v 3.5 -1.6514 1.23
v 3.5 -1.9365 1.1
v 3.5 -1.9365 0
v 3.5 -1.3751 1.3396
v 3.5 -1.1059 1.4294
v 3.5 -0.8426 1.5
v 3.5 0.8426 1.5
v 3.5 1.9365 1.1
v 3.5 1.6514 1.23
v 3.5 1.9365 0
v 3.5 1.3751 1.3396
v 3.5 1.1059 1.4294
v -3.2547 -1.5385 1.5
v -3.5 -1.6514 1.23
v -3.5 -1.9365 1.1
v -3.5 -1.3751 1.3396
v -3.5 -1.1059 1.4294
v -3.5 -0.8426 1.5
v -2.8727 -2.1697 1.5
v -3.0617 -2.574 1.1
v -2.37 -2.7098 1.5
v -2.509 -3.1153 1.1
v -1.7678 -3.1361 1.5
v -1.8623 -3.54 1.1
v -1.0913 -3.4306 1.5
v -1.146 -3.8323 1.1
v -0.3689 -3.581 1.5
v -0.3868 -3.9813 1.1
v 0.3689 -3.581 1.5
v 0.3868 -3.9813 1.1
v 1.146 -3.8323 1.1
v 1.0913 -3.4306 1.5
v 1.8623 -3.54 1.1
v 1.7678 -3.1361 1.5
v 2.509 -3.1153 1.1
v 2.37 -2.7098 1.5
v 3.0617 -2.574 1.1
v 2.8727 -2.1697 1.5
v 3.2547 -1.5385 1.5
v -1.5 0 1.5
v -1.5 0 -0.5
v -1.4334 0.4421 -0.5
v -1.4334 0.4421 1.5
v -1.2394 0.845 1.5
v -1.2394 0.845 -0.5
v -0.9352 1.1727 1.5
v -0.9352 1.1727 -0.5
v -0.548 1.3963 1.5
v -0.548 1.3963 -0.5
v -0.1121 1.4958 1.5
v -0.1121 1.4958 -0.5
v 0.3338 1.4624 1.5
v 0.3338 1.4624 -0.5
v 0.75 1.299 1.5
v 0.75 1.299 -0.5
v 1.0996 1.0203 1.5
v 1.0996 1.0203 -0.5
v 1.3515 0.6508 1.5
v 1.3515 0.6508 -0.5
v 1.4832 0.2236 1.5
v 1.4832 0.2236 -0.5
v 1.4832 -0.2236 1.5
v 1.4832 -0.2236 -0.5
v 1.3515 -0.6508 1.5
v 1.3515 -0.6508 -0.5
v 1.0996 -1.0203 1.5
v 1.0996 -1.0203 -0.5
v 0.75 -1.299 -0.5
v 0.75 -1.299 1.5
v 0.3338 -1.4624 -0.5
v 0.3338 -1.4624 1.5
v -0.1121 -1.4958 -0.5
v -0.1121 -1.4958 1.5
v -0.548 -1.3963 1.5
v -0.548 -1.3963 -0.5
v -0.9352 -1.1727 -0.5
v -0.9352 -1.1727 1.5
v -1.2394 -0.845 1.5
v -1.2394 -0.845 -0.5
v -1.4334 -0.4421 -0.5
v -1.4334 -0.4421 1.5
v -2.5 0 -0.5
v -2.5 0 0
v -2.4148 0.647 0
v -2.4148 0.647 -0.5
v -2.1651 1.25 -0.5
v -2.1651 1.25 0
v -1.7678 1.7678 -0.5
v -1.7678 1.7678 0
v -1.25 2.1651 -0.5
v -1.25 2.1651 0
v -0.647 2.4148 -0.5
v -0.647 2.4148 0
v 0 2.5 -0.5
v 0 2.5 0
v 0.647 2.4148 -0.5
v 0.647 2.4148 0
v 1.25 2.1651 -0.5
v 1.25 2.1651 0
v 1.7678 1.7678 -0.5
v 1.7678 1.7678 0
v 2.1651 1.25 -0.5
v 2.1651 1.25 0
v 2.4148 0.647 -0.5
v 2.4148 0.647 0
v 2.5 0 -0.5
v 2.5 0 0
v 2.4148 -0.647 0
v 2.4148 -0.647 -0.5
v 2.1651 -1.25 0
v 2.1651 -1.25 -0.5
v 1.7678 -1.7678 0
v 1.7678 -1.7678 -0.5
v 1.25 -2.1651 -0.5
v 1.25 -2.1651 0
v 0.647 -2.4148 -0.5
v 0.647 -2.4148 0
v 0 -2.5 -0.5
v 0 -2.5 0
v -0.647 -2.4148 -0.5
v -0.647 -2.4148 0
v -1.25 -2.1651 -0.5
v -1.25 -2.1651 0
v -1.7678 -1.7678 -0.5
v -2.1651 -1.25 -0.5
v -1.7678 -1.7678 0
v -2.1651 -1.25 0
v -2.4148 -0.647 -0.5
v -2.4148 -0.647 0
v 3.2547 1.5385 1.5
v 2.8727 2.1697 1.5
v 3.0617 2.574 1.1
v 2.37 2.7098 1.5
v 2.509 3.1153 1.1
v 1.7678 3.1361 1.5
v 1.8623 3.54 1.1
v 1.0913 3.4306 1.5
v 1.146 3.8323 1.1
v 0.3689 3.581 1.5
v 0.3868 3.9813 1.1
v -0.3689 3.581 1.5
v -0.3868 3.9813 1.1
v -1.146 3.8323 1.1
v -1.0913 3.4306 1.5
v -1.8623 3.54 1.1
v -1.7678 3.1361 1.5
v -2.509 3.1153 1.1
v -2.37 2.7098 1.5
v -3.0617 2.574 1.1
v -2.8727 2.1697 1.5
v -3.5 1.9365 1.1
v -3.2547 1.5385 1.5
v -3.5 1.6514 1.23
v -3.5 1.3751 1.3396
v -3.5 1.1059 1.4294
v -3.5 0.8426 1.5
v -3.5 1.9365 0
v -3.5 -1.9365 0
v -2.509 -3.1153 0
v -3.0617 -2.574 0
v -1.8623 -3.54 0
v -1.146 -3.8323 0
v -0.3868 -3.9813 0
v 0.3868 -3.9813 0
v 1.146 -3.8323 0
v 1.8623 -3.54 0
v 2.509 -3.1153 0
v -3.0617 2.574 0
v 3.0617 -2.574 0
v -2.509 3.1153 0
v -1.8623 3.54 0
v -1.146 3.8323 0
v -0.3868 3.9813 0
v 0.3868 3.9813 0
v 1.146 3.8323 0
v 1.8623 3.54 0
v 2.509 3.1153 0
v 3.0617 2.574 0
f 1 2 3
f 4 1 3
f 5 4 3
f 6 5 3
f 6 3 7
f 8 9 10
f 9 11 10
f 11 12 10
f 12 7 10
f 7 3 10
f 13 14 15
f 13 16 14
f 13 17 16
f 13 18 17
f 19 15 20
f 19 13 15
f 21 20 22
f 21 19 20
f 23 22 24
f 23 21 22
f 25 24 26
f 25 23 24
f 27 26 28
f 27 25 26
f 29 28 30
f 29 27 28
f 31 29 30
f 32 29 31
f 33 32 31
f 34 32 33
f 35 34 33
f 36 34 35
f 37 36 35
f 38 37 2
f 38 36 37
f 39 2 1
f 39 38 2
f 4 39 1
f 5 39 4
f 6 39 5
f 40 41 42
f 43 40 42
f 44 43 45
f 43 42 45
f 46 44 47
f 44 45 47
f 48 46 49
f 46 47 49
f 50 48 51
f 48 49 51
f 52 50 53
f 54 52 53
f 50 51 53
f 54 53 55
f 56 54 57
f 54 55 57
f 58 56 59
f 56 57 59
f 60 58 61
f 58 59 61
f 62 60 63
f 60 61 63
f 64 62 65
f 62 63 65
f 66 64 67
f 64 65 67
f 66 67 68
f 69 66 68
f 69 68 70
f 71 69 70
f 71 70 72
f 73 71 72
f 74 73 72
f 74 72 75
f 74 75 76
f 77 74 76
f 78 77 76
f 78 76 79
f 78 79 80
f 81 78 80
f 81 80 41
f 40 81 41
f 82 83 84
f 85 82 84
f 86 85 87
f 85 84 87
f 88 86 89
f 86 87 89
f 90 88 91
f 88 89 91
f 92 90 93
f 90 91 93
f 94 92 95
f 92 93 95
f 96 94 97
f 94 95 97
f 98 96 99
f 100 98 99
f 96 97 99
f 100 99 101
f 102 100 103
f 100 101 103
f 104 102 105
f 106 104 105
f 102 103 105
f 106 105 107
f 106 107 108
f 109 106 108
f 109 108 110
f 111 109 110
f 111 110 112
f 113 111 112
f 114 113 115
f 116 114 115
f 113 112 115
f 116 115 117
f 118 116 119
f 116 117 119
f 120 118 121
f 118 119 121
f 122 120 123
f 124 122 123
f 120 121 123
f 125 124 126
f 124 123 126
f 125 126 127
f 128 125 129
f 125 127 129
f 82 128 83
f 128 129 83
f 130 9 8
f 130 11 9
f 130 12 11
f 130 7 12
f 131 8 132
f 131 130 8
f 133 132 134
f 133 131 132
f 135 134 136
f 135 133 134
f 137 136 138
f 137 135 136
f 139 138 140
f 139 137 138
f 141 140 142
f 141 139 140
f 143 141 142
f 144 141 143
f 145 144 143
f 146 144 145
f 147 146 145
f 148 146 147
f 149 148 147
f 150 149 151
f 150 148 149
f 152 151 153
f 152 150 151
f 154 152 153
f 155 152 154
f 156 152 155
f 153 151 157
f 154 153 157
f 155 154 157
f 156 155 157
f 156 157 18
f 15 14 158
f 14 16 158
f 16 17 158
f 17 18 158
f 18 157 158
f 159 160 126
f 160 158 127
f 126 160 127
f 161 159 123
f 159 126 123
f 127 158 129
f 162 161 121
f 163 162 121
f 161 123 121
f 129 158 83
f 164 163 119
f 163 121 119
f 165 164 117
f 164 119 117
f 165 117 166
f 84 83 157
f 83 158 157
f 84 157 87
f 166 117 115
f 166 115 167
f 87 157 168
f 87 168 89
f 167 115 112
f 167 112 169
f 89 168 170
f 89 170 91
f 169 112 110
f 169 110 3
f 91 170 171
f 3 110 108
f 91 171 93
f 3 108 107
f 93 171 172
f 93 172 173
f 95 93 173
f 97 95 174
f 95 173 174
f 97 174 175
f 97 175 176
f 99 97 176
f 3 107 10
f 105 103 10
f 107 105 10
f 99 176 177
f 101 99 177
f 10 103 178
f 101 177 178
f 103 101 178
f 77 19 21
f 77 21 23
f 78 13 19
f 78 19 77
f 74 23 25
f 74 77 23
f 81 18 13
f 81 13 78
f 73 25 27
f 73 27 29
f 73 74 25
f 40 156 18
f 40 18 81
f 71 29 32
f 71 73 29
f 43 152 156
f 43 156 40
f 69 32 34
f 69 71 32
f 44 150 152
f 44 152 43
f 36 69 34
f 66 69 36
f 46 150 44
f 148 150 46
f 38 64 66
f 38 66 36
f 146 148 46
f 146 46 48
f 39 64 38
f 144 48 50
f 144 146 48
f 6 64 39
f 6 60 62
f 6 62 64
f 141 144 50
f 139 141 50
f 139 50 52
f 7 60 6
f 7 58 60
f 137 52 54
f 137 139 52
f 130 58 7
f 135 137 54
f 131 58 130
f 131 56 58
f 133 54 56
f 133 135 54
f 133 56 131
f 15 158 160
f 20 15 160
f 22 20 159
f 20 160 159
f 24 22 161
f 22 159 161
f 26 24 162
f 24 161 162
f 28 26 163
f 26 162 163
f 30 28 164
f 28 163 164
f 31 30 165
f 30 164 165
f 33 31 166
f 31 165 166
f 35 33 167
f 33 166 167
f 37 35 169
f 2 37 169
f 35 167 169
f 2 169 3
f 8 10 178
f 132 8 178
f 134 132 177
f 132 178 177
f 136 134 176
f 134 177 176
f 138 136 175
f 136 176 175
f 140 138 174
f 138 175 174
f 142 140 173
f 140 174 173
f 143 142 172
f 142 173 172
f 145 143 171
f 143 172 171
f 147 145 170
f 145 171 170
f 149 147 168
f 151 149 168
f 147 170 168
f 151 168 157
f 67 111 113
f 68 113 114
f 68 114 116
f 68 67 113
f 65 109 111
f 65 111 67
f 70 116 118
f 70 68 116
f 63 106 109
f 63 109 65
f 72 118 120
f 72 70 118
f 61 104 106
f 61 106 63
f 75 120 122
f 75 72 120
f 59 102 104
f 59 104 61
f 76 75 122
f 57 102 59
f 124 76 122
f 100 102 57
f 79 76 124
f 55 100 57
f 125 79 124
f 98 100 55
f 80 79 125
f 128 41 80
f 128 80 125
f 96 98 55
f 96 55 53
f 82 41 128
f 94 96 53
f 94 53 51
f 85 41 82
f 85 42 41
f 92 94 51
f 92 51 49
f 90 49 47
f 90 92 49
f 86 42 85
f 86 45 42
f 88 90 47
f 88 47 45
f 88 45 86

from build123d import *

# Parameters (mm, degrees)
BOSS_EXTRUDE1_DEPTH   = 1.5
SKETCH3_R             = 2.5
BOSS_EXTRUDE2_DEPTH   = 0.5
CHAMFER1_SIZE         = 0.4
F_3_0MM_DOWEL_HOLE1_D = 3


with BuildPart() as part:
    # Sketch1 → Boss-Extrude1 (new body)
    with BuildSketch(Plane.XY):
        with BuildLine():
            Line((-3.5, 1.936491673), (-3.5, -1.936491673))
            ThreePointArc((-3.5, -1.936491673), (0, -4), (3.5, -1.936491673))
            Line((3.5, -1.936491673), (3.5, 1.936491673))
            ThreePointArc((3.5, 1.936491673), (0, 4), (-3.5, 1.936491673))
        make_face()
    extrude(amount=BOSS_EXTRUDE1_DEPTH)

    # Sketch3 → Boss-Extrude2 (add)
    with BuildSketch(Plane(origin=(0, 0, 0), x_dir=(-1, 0, 0), z_dir=(0, 0, -1))):
        Circle(SKETCH3_R)
    extrude(amount=BOSS_EXTRUDE2_DEPTH)

    # Chamfer1
    chamfer1_edges = [part.edges().sort_by_distance(p)[0] for p in [
        (0, 4, 1.5),
        (0, -4, 1.5),
    ]]
    chamfer(chamfer1_edges, length=CHAMFER1_SIZE)

    # Ø3.0mm Dowel Hole1 (through all)
    with Locations(Plane.XY.offset(1.5)):
        with Locations((0, 0)):
            Hole(F_3_0MM_DOWEL_HOLE1_D / 2)


solid = part.part
